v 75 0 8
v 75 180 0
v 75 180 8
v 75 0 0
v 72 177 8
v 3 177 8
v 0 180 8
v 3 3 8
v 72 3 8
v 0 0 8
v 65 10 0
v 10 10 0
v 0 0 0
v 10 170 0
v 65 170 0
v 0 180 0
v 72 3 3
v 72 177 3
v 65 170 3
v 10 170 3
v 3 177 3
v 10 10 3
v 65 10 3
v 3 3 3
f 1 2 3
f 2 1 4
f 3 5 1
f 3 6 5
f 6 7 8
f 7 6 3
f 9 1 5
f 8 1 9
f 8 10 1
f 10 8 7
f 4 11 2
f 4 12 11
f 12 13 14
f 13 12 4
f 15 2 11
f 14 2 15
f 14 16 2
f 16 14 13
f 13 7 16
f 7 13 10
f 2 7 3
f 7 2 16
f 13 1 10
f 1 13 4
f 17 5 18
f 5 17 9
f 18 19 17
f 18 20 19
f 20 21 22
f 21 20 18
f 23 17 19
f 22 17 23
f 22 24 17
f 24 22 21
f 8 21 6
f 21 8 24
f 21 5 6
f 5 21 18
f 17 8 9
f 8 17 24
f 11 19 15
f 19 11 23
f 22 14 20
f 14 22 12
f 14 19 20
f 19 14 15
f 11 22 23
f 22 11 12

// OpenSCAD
width=69;
height=174;
back_rim_width=7;
side_rim_width=5;
back_rim_thickness=3;
side_rim_thickness=3;
bissl=1/100;

difference() {
  cube([width+2*side_rim_thickness,height+2*side_rim_thickness,back_rim_thickness+side_rim_width]);
  translate([side_rim_thickness,side_rim_thickness,back_rim_thickness]) {
    cube([width,height,side_rim_width+bissl]);
  }
  translate([side_rim_thickness+back_rim_width,side_rim_thickness+back_rim_width,-bissl]) {
    cube([width-2*back_rim_width,height-2*back_rim_width,back_rim_thickness+2*bissl]);
  }
}
